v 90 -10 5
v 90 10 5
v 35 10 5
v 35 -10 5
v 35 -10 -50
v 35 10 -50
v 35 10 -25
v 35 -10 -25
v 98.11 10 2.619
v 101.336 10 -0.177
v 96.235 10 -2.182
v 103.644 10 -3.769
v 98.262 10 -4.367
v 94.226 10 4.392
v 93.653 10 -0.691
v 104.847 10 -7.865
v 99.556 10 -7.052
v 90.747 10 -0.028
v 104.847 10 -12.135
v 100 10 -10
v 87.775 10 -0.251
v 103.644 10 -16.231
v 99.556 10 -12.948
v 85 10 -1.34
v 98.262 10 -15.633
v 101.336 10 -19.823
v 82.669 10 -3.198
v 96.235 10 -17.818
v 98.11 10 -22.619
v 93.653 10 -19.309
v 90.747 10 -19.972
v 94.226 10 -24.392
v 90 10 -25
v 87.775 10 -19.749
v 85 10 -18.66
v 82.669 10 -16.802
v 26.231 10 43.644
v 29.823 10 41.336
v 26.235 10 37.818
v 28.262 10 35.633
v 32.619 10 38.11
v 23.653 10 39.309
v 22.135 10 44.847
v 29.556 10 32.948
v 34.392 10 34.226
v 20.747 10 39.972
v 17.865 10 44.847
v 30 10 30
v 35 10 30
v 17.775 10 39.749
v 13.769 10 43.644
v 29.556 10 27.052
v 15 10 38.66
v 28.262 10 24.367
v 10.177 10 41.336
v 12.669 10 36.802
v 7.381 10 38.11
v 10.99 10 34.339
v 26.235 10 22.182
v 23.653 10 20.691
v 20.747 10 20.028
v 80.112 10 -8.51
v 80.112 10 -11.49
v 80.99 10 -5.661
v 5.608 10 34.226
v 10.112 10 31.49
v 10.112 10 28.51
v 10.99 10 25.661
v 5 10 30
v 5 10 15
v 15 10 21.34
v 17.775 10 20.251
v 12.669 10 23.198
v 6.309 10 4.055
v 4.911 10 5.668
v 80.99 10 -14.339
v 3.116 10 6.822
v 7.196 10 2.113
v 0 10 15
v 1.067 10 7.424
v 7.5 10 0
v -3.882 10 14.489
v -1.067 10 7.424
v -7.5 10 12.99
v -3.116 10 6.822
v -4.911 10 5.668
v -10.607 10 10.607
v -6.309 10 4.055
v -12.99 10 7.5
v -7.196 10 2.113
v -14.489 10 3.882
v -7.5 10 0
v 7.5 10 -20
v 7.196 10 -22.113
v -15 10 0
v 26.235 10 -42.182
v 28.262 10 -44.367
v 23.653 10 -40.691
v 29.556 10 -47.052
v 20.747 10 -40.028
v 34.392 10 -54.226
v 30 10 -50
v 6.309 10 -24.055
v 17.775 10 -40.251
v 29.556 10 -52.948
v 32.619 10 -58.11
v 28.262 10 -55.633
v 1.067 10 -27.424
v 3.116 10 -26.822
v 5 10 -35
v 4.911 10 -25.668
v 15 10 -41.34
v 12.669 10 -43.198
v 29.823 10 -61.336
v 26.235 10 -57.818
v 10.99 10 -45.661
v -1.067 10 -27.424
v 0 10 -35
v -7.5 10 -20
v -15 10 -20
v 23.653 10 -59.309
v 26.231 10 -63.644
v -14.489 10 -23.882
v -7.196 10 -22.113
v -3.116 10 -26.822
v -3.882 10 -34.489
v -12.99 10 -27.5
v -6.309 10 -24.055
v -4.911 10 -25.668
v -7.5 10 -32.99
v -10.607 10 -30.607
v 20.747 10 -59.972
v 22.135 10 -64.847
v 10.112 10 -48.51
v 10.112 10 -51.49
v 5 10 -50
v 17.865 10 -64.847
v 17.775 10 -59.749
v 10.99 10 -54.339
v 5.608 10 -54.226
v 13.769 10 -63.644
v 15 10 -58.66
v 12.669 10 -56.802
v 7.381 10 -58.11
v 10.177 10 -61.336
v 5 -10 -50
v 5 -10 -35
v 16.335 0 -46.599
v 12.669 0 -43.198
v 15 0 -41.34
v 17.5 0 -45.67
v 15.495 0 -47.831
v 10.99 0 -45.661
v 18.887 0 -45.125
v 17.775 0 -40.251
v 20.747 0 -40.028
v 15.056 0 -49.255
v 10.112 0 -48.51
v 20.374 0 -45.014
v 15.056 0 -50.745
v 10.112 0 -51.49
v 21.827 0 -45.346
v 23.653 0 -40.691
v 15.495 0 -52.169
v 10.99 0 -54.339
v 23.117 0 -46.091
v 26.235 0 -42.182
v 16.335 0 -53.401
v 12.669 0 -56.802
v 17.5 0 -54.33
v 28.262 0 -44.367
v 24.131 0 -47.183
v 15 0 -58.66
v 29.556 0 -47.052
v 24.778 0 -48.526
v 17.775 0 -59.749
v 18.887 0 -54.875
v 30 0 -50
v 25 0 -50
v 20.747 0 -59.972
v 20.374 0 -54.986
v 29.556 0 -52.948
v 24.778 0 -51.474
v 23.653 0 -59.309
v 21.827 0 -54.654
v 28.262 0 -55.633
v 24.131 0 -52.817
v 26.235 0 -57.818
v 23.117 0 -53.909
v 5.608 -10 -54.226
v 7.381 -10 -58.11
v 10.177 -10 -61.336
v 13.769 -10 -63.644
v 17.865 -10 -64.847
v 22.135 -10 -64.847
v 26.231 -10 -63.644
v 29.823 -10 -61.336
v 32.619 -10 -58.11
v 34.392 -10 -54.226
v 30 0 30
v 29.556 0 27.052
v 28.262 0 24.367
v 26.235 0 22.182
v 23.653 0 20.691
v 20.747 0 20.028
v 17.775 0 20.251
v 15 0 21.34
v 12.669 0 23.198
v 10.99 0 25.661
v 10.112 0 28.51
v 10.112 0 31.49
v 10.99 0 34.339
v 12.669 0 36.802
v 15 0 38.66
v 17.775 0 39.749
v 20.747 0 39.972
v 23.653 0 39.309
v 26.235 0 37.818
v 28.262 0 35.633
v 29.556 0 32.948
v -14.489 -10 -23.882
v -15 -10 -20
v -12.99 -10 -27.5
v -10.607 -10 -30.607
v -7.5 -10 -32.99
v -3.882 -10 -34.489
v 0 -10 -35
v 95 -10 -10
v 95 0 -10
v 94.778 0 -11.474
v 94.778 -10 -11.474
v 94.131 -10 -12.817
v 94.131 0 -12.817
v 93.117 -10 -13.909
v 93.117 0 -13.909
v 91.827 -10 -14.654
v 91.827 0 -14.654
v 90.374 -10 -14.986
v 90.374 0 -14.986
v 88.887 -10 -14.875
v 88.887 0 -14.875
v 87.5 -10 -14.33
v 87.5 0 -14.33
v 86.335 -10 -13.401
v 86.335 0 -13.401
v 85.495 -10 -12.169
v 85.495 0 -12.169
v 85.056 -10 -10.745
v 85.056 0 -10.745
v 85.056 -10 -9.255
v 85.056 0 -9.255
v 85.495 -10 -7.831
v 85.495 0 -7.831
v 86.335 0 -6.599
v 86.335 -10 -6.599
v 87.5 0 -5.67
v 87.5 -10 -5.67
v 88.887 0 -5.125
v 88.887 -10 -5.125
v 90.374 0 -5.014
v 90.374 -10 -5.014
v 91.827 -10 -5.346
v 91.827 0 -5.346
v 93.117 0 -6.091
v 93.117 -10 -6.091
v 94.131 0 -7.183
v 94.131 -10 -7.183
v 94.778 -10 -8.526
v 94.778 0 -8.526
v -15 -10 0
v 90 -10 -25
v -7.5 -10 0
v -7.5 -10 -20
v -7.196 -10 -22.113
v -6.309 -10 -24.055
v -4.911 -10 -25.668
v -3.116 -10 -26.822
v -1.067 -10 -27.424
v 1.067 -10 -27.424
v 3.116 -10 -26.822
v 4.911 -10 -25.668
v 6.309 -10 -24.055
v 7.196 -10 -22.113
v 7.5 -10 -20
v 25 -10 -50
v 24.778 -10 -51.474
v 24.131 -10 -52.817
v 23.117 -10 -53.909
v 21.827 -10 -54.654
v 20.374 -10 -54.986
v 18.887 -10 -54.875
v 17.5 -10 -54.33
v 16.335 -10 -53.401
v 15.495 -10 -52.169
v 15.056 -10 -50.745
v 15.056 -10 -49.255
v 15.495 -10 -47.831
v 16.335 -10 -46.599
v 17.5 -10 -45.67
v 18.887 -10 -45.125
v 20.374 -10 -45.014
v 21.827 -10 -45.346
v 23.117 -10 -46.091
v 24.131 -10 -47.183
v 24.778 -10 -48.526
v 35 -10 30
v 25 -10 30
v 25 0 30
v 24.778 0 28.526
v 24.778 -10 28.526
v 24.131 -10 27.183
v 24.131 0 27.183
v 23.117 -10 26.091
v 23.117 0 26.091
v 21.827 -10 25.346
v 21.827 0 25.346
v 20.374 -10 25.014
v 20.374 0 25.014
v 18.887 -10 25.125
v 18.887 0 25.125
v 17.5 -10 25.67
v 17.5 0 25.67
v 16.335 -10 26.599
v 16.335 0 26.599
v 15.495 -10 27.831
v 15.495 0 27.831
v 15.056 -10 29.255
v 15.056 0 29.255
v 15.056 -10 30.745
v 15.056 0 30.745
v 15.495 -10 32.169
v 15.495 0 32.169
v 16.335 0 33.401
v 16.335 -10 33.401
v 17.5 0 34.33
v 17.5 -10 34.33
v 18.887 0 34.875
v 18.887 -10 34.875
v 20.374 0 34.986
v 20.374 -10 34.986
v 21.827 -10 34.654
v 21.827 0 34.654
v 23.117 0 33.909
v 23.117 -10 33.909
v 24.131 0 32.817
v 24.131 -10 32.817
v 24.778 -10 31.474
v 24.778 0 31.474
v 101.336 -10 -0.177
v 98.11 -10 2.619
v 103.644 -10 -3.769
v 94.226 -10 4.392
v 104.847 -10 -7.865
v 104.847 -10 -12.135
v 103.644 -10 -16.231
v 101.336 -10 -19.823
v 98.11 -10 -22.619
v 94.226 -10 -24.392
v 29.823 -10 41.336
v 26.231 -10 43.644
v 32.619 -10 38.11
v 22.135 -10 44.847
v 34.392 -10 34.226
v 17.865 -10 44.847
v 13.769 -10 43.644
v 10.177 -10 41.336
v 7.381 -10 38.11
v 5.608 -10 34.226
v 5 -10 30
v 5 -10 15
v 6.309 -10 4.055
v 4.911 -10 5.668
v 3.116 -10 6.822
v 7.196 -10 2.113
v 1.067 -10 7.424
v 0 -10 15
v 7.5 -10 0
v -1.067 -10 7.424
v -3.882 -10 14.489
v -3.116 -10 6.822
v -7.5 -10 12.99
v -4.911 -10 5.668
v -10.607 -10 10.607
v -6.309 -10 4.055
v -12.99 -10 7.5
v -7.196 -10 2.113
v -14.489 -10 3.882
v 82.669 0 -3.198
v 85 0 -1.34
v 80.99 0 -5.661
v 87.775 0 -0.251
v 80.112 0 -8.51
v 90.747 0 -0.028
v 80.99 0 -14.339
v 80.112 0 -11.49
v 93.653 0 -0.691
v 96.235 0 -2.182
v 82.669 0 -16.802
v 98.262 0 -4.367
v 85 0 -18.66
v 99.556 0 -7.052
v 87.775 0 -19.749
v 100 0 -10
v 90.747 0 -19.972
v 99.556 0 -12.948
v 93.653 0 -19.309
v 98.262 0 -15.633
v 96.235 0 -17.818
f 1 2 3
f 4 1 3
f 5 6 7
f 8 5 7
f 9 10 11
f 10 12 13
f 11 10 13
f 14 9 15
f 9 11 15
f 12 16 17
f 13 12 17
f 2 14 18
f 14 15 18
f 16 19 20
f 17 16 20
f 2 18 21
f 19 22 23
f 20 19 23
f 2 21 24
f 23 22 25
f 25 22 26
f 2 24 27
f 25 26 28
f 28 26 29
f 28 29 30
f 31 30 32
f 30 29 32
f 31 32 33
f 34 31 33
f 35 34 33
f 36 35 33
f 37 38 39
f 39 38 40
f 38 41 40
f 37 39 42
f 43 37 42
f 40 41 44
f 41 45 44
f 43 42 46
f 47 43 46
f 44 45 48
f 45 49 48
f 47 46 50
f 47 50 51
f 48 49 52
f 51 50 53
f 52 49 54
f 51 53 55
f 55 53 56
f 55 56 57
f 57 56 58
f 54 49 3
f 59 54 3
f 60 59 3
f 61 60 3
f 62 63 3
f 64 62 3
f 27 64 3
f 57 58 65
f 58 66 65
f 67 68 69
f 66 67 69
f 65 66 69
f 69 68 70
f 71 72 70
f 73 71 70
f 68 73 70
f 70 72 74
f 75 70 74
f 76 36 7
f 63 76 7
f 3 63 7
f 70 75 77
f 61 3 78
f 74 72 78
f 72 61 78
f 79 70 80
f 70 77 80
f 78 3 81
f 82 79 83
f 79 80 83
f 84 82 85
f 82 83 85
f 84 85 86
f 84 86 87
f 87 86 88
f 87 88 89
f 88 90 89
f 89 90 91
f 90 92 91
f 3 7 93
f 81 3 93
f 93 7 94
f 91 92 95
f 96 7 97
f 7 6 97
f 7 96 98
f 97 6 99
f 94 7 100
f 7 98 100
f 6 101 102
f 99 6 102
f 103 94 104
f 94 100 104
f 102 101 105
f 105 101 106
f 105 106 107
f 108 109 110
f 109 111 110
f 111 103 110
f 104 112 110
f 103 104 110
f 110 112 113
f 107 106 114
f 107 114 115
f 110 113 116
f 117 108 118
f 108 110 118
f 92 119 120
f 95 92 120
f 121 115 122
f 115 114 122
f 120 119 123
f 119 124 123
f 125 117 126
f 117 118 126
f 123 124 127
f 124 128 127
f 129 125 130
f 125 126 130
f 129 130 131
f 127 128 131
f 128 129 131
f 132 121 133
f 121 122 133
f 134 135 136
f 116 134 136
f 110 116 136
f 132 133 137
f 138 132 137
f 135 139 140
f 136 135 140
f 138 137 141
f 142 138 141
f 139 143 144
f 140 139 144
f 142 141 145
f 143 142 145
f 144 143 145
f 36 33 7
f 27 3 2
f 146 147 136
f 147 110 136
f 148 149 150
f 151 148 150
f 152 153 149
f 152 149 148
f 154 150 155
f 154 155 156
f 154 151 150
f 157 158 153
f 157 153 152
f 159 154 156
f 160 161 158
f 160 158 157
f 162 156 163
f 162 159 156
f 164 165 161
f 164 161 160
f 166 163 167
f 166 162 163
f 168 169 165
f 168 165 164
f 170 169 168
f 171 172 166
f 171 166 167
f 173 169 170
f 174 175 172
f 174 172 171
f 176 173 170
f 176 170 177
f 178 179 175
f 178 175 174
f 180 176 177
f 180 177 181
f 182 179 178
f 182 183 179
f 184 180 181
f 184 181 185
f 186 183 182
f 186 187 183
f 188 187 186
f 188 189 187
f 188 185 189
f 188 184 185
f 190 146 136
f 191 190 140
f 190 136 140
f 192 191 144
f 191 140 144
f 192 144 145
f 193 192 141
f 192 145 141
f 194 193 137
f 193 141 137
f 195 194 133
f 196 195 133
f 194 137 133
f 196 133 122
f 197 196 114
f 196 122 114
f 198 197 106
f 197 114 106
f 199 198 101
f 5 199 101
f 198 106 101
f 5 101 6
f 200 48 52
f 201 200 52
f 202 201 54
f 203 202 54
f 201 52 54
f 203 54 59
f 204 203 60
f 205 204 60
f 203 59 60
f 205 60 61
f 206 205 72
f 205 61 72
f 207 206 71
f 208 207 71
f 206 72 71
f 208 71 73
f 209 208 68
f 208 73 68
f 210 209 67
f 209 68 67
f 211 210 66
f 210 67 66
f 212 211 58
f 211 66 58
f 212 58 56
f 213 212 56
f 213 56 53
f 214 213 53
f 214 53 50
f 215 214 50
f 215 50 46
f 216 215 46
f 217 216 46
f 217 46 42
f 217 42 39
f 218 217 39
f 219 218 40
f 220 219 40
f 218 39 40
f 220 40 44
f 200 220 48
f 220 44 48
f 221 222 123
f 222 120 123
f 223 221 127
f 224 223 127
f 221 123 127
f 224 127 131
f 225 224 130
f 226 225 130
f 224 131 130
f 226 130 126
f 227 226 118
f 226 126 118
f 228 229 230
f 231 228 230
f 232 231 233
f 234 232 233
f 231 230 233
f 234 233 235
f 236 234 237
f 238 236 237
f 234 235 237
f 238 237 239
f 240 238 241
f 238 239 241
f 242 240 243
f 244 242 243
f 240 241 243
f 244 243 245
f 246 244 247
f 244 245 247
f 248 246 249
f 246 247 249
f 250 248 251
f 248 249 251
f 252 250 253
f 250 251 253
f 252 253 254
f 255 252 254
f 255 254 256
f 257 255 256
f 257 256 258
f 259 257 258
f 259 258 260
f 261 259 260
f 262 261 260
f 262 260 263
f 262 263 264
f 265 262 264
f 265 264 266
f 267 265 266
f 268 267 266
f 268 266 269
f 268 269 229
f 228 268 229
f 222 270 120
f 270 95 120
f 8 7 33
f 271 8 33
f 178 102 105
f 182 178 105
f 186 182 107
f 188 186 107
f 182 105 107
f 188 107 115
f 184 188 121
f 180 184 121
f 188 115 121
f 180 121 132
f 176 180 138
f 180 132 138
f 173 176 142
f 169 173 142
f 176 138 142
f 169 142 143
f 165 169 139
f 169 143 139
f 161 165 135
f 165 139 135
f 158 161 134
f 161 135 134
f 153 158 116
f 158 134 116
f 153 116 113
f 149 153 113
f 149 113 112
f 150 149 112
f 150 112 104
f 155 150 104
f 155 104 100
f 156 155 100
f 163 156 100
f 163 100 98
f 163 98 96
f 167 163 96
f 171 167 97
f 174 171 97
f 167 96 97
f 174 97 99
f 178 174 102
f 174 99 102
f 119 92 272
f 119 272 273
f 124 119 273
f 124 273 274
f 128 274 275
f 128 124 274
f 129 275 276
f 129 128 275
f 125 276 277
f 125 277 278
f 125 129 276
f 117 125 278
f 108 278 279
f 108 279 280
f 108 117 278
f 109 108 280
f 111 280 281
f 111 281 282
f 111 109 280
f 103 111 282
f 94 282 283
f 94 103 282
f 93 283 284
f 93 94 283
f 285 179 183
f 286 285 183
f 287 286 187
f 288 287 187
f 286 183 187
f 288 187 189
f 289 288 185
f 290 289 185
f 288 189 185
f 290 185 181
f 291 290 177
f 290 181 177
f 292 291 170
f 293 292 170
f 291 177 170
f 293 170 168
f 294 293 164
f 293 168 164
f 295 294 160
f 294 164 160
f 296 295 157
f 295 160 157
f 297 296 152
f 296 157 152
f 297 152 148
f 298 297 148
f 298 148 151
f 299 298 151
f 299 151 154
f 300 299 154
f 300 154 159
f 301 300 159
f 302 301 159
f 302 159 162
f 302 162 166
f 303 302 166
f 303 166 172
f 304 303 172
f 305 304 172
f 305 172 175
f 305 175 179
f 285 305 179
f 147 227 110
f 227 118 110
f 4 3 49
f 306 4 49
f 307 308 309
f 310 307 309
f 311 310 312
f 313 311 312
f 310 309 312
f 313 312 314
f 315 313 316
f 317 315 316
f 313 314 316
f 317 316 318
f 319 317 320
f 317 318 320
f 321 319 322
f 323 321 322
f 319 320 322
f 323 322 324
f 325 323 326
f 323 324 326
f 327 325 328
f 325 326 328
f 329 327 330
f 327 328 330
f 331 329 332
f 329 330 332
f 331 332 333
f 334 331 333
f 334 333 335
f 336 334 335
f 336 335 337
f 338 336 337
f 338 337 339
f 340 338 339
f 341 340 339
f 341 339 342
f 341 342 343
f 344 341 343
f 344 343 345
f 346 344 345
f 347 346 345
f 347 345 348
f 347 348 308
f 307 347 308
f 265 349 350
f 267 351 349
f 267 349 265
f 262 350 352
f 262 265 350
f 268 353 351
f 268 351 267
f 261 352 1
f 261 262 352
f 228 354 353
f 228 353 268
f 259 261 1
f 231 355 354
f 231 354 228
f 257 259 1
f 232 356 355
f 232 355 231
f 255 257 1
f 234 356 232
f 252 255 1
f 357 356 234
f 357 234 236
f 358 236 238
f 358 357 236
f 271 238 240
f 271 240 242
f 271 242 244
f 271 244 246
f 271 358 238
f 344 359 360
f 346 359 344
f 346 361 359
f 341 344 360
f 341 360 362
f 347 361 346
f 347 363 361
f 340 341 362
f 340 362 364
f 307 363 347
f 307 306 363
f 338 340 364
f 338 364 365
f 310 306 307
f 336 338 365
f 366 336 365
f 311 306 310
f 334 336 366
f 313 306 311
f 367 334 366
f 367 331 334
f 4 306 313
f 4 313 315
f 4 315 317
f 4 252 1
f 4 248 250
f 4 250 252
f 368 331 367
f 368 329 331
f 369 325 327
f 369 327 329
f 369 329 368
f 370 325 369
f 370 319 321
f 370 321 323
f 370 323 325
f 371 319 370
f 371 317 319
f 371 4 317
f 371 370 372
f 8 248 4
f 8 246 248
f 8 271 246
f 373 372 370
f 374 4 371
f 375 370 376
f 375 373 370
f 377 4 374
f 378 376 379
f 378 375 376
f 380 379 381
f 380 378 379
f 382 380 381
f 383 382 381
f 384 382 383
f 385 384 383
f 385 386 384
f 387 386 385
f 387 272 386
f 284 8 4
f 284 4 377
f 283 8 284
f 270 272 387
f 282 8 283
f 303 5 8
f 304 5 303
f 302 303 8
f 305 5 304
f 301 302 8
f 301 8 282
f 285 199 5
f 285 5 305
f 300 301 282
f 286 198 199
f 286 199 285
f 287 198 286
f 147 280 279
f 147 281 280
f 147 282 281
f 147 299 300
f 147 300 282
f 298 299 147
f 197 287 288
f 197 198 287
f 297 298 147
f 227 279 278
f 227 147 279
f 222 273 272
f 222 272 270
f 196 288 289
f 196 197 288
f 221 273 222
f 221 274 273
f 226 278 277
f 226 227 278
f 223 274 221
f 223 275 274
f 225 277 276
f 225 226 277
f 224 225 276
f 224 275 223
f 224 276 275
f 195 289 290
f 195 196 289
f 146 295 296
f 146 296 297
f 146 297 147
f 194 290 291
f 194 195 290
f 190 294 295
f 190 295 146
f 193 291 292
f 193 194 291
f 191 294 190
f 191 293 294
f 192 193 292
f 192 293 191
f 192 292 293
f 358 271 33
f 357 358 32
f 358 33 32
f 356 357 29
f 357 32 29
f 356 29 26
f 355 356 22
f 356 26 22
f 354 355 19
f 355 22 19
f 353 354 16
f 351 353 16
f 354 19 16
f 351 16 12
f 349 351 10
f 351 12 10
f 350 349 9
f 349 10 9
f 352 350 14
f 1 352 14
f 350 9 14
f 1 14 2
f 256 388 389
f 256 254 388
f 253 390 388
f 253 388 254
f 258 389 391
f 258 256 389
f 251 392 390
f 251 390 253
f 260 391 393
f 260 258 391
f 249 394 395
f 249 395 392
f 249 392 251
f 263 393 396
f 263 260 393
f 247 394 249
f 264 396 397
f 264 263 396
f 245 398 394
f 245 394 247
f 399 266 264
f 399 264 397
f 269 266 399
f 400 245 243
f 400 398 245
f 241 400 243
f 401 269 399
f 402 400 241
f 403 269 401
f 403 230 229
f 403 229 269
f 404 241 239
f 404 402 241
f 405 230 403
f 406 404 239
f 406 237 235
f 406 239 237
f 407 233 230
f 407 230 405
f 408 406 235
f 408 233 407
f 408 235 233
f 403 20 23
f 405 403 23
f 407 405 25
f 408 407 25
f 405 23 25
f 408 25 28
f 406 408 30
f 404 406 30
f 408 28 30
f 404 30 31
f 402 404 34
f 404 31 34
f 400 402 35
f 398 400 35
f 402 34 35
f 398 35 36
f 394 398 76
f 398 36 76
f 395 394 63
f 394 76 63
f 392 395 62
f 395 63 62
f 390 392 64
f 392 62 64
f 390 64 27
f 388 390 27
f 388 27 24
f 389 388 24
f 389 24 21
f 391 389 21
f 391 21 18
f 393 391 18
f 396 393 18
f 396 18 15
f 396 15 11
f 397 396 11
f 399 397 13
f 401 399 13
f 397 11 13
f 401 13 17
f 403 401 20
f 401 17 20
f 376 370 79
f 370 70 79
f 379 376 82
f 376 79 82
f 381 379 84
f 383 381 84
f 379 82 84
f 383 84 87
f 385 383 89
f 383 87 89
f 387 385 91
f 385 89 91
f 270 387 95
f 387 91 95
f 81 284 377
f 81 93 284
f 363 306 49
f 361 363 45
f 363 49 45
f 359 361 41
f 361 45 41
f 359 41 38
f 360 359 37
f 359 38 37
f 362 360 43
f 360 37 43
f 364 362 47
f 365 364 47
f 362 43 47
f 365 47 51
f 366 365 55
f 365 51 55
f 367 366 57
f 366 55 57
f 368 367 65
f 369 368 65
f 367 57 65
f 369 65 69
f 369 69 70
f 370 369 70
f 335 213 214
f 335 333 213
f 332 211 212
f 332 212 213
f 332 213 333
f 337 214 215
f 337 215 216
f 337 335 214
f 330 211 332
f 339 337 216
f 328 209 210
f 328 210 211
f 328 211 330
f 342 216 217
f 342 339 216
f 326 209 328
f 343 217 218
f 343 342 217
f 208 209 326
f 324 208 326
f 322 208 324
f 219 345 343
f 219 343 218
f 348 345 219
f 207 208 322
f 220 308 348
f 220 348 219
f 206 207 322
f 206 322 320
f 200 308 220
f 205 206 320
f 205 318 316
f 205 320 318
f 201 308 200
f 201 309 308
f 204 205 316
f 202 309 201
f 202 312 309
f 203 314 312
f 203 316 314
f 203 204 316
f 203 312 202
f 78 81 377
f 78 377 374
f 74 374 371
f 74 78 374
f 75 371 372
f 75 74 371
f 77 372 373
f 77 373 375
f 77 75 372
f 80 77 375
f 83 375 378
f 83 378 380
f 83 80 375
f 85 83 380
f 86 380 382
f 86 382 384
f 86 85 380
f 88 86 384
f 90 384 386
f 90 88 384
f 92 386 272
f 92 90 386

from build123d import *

# Parameters (mm, degrees)
BOSS_EXTRUDE2_DEPTH = 10
SKETCH3_R           = 10
CUT_EXTRUDE1_DEPTH  = 10
SKETCH4_R           = 5
CUT_EXTRUDE2_DEPTH  = 21


with BuildPart() as part:
    # Sketch2 → Boss-Extrude2 (new body, symmetric)
    with BuildSketch(Plane(origin=(0, 0, 0), x_dir=(1, 0, 0), z_dir=(0, 1, 0))):
        with BuildLine():
            Line((5, -30), (5, -15))
            Line((5, -15), (0, -15))
            ThreePointArc((0, -15), (-10.606601718, -10.606601718), (-15, 0))
            Line((-15, 0), (-15, 20))
            ThreePointArc((-15, 20), (-10.606601718, 30.606601718), (0, 35))
            Line((0, 35), (5, 35))
            Line((5, 35), (5, 50))
            ThreePointArc((5, 50), (20, 65), (35, 50))
            Line((35, 50), (35, 25))
            Line((35, 25), (90, 25))
            ThreePointArc((90, 25), (105, 10), (90, -5))
            Line((90, -5), (35, -5))
            Line((35, -5), (35, -30))
            ThreePointArc((35, -30), (20, -45), (5, -30))
        make_face()
        with BuildLine():
            Line((7.5, 20), (7.5, 0))
            ThreePointArc((7.5, 0), (0, -7.5), (-7.5, 0))
            Line((-7.5, 0), (-7.5, 20))
            ThreePointArc((-7.5, 20), (0, 27.5), (7.5, 20))
        make_face(mode=Mode.SUBTRACT)
    extrude(amount=BOSS_EXTRUDE2_DEPTH, both=True)

    # Sketch3 → Cut-Extrude1 (cut)
    with BuildSketch(Plane(origin=(0, 10, 0), x_dir=(1, 0, 0), z_dir=(0, 1, 0))):
        with Locations((90, 10)):
            Circle(SKETCH3_R)
        with Locations((20, 50)):
            Circle(SKETCH3_R)
        with Locations((20, -30)):
            Circle(SKETCH3_R)
    extrude(amount=-CUT_EXTRUDE1_DEPTH, mode=Mode.SUBTRACT)

    # Sketch4 → Cut-Extrude2 (cut, through all)
    with BuildSketch(Plane(origin=(0, 10, 0), x_dir=(1, 0, 0), z_dir=(0, 1, 0))):
        with Locations((20, 50)):
            Circle(SKETCH4_R)
        with Locations((20, -30)):
            Circle(SKETCH4_R)
        with Locations((90, 10)):
            Circle(SKETCH4_R)
    extrude(amount=-CUT_EXTRUDE2_DEPTH, mode=Mode.SUBTRACT)


solid = part.part
